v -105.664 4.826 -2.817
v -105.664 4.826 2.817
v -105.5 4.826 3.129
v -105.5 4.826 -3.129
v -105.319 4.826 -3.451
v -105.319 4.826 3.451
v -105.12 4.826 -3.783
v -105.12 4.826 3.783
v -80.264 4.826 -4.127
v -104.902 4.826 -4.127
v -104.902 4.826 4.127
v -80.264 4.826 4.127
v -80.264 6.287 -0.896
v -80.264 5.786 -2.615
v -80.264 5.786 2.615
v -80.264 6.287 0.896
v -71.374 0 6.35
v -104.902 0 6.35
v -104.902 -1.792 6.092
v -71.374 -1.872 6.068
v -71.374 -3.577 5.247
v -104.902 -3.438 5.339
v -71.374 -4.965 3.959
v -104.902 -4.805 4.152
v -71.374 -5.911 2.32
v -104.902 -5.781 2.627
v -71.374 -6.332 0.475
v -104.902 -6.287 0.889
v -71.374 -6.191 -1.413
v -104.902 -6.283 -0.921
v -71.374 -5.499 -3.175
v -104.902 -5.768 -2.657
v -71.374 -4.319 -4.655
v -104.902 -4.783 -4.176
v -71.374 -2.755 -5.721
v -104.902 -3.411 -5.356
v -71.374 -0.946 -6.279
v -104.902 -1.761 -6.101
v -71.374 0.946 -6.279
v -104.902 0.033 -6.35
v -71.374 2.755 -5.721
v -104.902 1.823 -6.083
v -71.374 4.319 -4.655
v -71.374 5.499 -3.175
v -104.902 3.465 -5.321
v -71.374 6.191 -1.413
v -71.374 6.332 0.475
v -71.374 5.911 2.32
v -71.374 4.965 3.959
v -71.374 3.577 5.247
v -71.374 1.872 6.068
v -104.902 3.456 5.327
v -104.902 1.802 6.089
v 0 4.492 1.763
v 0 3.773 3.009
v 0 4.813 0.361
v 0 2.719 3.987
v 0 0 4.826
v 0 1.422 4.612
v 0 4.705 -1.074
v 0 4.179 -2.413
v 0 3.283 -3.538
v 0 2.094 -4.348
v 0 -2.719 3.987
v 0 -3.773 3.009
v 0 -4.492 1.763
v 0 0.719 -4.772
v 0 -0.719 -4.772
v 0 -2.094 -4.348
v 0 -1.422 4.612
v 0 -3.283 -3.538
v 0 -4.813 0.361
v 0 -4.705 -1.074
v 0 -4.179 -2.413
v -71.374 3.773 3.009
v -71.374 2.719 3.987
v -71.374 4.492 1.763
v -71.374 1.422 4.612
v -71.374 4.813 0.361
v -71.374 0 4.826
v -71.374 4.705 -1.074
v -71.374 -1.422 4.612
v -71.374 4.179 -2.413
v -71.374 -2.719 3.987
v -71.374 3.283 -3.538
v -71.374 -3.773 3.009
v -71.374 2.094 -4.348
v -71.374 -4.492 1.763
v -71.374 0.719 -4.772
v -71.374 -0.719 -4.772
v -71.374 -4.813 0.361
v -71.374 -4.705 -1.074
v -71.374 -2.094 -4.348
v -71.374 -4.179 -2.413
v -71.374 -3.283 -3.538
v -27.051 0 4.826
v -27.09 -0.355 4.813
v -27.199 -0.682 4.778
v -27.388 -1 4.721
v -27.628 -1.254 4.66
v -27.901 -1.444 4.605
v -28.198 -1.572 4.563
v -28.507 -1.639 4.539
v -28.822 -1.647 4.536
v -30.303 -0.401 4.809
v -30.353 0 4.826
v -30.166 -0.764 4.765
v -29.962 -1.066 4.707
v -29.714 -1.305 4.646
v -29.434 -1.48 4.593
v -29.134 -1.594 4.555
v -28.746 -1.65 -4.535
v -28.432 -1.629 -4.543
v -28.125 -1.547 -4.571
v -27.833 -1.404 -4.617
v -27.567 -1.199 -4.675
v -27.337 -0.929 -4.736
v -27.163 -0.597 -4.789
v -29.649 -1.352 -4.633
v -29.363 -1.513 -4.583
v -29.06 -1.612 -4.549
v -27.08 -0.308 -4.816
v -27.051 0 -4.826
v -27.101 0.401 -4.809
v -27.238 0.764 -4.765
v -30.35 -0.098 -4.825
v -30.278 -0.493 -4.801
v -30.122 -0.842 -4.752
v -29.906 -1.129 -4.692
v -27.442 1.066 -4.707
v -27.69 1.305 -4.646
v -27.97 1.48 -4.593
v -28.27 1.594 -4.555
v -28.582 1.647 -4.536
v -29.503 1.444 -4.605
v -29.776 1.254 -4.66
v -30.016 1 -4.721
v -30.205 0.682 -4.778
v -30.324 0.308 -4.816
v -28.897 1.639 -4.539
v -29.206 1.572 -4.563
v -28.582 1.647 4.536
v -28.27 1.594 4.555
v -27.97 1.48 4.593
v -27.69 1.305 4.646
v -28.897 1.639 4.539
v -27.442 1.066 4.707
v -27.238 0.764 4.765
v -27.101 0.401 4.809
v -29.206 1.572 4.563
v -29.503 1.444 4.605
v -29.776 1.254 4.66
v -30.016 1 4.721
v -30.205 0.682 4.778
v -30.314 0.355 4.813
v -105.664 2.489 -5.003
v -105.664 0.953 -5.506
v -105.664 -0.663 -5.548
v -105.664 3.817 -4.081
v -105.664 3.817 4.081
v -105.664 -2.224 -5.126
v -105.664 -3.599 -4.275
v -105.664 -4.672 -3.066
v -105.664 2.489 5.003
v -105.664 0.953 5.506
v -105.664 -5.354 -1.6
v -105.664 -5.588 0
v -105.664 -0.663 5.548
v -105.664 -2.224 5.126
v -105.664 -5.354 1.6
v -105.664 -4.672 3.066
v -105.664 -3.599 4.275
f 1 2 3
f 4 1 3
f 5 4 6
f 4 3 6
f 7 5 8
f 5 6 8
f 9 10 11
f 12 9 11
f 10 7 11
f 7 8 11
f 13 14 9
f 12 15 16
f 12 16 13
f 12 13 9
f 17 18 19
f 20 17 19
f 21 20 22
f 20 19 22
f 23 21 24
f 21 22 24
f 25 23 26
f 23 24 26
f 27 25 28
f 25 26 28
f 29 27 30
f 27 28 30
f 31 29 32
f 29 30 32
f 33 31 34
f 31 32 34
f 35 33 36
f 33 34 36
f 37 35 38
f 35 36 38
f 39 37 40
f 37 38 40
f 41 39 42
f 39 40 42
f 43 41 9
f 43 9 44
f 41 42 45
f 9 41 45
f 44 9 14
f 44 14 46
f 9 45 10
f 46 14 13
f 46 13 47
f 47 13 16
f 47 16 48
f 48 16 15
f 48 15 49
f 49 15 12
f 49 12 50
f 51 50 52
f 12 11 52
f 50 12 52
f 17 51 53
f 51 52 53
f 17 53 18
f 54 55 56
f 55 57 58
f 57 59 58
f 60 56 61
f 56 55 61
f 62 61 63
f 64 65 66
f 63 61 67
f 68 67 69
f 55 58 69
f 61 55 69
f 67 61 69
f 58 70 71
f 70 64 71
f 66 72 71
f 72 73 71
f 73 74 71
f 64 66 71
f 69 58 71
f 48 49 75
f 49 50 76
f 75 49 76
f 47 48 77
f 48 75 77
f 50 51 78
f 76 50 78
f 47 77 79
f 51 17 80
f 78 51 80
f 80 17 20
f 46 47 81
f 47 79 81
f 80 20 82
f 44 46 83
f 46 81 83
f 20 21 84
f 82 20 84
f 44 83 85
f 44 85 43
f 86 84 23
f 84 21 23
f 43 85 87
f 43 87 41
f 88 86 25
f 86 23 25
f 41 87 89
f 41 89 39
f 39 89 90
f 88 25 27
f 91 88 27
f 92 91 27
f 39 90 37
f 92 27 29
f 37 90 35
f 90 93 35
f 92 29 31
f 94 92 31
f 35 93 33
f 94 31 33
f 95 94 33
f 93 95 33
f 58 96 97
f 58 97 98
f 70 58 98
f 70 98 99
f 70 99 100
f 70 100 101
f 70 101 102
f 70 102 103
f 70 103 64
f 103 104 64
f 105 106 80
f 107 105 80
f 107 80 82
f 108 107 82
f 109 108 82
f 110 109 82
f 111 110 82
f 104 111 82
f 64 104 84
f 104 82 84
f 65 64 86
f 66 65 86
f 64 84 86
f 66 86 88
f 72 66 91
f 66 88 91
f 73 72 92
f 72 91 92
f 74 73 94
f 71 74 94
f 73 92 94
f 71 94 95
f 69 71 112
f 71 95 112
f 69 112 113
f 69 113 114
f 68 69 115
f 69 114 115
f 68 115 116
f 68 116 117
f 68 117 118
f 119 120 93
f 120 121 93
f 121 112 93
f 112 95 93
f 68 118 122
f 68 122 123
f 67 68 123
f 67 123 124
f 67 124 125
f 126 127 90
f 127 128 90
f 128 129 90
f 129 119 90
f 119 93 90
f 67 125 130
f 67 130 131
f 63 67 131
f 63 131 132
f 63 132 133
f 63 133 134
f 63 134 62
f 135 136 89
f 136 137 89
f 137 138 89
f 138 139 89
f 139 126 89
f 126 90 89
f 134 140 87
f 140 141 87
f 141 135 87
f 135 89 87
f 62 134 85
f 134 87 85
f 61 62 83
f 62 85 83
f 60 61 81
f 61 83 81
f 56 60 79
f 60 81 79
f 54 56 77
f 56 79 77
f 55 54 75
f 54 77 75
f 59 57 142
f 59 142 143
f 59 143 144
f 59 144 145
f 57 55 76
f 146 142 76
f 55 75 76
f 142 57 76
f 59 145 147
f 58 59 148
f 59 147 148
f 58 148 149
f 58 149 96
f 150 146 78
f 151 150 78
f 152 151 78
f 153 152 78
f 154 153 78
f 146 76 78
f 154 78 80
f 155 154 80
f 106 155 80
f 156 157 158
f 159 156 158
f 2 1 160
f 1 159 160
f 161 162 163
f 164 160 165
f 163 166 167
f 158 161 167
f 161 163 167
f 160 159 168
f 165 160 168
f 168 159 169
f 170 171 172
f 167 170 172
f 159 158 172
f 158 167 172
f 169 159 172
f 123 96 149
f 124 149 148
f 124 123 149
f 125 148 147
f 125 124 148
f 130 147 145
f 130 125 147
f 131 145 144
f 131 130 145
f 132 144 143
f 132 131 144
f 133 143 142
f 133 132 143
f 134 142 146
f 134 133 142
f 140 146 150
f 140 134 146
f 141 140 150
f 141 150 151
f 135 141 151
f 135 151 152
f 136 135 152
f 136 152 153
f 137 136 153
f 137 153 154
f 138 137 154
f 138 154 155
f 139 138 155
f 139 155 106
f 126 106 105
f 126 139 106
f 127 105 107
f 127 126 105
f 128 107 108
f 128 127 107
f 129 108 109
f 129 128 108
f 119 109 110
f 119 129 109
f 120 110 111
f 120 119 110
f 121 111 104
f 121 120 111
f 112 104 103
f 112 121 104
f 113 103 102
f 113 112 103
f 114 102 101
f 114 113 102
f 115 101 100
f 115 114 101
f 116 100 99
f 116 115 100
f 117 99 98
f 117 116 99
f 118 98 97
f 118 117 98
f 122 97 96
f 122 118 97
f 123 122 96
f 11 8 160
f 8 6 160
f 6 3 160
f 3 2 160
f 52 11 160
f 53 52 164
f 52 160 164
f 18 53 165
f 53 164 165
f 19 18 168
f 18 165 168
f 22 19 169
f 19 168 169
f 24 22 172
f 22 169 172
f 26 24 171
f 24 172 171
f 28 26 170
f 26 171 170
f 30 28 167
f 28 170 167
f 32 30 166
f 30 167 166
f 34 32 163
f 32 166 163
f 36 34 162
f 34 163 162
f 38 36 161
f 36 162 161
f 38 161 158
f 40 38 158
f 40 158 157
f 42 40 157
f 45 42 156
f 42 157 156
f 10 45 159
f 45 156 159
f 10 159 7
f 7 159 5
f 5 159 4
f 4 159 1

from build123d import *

# Parameters (mm, degrees)
CUT_EXTRUDE1_DEPTH      = 107.044923952
CUT_EXTRUDE1_DEPTH_BACK = 107.044923952
SKETCH2_R               = 1.651
CUT_EXTRUDE2_DEPTH      = 25.4
CHAMFER1_SIZE           = 0.762


with BuildPart() as part:
    # Sketch1 → Revolve1 (revolve)
    with BuildSketch(Plane.XY, mode=Mode.PRIVATE) as revolve1_sk:
        Polygon((0, 0), (0, 4.826), (-71.374, 4.826), (-71.374, 6.35), (-105.664, 6.35), (-105.664, 0), align=None)
    revolve(revolve1_sk.sketch.rotate(Axis((-91.219448406, 0, 0), (1, 0, 0)), 90), axis=Axis((-91.219448406, 0, 0), (1, 0, 0)))

    # Sketch2 → Cut-Extrude1 (cut, two sides: drawn at the far end of the back side and taken through both)
    with BuildSketch(Plane.XY.offset(-CUT_EXTRUDE1_DEPTH_BACK)):
        with Locations((-28.702, 0)):
            Circle(SKETCH2_R)
    extrude(amount=CUT_EXTRUDE1_DEPTH + CUT_EXTRUDE1_DEPTH_BACK, mode=Mode.SUBTRACT)

    # Sketch4 → Cut-Extrude2 (cut)
    with BuildSketch(Plane.ZY.offset(105.664)):
        with BuildLine():
            Line((-4.12701151, 4.826), (4.12701151, 4.826))
            ThreePointArc((4.12701151, 4.826), (0, 6.35), (-4.12701151, 4.826))
        make_face()
    extrude(amount=-CUT_EXTRUDE2_DEPTH, mode=Mode.SUBTRACT)

    # Chamfer1
    chamfer1_edges = [part.edges().sort_by_distance(p)[0] for p in [
        (-105.664, -5.76753947, -2.656687497),
    ]]
    chamfer(chamfer1_edges, length=CHAMFER1_SIZE)


solid = part.part
